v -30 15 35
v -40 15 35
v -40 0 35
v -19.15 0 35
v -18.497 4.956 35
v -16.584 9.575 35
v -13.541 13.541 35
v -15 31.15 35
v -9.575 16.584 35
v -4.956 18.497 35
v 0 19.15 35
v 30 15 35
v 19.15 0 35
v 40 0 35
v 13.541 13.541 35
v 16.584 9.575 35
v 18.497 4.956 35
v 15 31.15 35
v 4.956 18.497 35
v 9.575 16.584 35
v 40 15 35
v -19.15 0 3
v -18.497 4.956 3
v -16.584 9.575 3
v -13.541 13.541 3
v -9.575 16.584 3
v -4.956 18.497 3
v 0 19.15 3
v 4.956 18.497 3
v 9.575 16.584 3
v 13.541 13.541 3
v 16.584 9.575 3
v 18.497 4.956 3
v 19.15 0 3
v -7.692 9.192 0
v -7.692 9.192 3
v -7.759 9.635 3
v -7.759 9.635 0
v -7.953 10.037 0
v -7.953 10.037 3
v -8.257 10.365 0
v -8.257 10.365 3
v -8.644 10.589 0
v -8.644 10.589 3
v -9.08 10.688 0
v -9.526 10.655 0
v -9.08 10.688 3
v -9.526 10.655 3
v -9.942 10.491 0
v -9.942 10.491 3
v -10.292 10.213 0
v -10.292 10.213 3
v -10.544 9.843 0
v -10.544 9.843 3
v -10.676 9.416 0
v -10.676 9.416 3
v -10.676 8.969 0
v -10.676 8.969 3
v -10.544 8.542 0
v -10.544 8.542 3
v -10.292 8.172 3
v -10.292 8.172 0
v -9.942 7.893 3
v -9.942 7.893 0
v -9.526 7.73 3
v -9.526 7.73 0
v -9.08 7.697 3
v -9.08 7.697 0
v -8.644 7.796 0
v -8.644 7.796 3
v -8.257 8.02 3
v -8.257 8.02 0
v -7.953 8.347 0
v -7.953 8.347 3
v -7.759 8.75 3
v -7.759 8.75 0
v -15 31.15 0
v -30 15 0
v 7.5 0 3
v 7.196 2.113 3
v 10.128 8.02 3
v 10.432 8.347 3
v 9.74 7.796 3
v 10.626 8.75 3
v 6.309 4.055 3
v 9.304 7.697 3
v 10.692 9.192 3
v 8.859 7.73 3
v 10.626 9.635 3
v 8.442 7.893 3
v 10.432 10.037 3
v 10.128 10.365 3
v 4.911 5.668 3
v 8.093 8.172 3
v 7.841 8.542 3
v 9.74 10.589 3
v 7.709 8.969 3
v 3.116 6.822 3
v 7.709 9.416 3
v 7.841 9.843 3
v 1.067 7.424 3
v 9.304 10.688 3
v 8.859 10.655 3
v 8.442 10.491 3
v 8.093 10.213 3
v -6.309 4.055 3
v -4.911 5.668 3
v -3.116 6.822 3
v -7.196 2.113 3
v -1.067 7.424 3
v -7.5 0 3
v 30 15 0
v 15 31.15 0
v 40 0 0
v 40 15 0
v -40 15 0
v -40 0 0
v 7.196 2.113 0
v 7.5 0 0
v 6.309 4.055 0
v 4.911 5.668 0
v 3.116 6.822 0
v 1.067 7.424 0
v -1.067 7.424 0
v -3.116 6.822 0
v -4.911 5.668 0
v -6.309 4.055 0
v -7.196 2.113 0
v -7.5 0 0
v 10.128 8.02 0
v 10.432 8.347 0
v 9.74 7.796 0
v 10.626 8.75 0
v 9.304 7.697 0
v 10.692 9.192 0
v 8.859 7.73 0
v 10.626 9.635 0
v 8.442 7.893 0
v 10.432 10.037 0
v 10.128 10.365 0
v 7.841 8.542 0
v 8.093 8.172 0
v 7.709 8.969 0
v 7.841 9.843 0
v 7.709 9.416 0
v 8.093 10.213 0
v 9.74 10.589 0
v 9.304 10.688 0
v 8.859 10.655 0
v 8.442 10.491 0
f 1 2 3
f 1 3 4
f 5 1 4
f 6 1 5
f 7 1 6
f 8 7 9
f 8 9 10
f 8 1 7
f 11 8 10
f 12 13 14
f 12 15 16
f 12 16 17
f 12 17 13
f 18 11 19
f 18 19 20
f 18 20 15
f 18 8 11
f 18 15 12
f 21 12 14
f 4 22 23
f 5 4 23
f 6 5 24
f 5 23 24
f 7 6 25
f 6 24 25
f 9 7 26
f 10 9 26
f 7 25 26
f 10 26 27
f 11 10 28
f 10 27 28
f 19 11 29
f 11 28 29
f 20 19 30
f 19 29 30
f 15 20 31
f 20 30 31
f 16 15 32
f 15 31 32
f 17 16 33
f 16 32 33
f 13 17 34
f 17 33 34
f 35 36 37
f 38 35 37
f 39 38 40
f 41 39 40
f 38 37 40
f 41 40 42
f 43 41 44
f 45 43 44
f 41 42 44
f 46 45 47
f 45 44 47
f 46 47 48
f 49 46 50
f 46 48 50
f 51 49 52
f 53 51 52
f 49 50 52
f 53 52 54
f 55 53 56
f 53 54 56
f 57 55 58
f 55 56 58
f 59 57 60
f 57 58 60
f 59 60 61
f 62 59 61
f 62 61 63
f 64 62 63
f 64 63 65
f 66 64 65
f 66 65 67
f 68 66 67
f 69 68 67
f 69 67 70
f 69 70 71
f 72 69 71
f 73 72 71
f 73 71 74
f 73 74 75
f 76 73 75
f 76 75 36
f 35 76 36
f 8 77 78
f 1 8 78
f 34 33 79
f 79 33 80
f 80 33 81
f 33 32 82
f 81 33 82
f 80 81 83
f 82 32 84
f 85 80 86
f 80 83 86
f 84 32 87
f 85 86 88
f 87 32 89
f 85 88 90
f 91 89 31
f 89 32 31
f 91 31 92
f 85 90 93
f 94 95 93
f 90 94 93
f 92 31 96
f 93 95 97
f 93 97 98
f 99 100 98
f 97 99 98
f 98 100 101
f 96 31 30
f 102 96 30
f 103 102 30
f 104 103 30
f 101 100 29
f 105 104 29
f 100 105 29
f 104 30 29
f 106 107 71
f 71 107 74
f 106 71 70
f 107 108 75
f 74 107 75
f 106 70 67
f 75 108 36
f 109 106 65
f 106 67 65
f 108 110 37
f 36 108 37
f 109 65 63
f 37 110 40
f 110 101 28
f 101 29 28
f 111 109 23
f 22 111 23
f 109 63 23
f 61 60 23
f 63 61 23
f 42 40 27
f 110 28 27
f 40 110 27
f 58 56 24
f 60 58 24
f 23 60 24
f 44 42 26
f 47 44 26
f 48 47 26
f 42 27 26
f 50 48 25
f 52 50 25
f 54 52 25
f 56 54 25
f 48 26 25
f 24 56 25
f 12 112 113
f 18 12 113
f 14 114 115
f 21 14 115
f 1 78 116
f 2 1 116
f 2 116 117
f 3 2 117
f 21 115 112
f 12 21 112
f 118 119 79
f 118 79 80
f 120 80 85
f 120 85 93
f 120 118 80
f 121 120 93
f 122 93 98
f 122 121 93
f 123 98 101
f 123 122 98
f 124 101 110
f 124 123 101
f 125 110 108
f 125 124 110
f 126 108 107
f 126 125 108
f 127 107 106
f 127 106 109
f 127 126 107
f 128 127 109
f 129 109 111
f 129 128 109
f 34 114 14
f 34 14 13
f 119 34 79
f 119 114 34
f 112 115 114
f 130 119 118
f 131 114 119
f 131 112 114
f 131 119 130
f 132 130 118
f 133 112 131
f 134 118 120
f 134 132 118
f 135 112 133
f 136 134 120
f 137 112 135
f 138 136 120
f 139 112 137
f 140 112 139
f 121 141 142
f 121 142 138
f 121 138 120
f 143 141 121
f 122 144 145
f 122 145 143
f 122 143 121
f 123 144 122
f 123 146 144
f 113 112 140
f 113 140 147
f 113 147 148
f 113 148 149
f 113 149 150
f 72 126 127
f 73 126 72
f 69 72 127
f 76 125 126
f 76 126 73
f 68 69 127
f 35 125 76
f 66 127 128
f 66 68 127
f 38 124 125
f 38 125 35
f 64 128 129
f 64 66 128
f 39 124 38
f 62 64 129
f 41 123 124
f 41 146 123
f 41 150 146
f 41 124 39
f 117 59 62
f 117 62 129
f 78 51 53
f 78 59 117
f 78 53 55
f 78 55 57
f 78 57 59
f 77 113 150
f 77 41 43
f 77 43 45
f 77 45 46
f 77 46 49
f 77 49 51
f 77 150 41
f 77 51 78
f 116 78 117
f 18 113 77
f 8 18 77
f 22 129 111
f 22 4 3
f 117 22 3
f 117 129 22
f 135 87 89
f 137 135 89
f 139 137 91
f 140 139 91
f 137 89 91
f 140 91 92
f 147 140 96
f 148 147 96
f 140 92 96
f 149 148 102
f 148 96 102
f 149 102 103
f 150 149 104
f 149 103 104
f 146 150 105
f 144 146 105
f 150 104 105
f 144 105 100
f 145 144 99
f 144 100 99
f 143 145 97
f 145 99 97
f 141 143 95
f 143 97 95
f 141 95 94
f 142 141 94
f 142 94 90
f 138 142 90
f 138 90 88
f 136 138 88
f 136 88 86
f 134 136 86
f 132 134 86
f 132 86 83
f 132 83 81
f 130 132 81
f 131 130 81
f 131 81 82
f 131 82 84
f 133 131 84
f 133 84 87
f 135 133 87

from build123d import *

# Parameters (mm, degrees)
BOSS_EXTRUDE3_DEPTH = 35
BOSS_EXTRUDE4_DEPTH = 3
SKETCH4_R           = 1.5
CUT_EXTRUDE2_DEPTH  = 4


with BuildPart() as part:
    # Sketch1 → Boss-Extrude3 (new body)
    with BuildSketch(Plane.XY):
        with BuildLine():
            Line((19.15, 0), (40, 0))
            Line((40, 0), (40, 15))
            Line((40, 15), (30, 15))
            Line((30, 15), (15, 31.15))
            Line((15, 31.15), (-15, 31.15))
            Line((-15, 31.15), (-30, 15))
            Line((-30, 15), (-40, 15))
            Line((-40, 15), (-40, 0))
            Line((-40, 0), (-19.15, 0))
            ThreePointArc((-19.15, 0), (0, 19.15), (19.15, 0))
        make_face()
    extrude(amount=BOSS_EXTRUDE3_DEPTH)

    # Sketch6 → Boss-Extrude4 (add)
    with BuildSketch(Plane(origin=(0, 0, 0), x_dir=(-1, 0, 0), z_dir=(0, 0, -1))):
        with BuildLine():
            Line((-19.15, 0), (-7.5, 0))
            ThreePointArc((-7.5, 0), (0, 7.5), (7.5, 0))
            Line((7.5, 0), (19.15, 0))
            ThreePointArc((19.15, 0), (0, 19.15), (-19.15, 0))
        make_face()
    extrude(amount=-BOSS_EXTRUDE4_DEPTH)

    # Sketch4 → Cut-Extrude2 (cut, through all)
    with BuildSketch(Plane.XY.offset(3)):
        with Locations((9.192388155, 9.192388155)):
            Circle(SKETCH4_R)
        with Locations((-9.192388155, 9.192388155)):
            Circle(SKETCH4_R)
    extrude(amount=-CUT_EXTRUDE2_DEPTH, mode=Mode.SUBTRACT)


solid = part.part
